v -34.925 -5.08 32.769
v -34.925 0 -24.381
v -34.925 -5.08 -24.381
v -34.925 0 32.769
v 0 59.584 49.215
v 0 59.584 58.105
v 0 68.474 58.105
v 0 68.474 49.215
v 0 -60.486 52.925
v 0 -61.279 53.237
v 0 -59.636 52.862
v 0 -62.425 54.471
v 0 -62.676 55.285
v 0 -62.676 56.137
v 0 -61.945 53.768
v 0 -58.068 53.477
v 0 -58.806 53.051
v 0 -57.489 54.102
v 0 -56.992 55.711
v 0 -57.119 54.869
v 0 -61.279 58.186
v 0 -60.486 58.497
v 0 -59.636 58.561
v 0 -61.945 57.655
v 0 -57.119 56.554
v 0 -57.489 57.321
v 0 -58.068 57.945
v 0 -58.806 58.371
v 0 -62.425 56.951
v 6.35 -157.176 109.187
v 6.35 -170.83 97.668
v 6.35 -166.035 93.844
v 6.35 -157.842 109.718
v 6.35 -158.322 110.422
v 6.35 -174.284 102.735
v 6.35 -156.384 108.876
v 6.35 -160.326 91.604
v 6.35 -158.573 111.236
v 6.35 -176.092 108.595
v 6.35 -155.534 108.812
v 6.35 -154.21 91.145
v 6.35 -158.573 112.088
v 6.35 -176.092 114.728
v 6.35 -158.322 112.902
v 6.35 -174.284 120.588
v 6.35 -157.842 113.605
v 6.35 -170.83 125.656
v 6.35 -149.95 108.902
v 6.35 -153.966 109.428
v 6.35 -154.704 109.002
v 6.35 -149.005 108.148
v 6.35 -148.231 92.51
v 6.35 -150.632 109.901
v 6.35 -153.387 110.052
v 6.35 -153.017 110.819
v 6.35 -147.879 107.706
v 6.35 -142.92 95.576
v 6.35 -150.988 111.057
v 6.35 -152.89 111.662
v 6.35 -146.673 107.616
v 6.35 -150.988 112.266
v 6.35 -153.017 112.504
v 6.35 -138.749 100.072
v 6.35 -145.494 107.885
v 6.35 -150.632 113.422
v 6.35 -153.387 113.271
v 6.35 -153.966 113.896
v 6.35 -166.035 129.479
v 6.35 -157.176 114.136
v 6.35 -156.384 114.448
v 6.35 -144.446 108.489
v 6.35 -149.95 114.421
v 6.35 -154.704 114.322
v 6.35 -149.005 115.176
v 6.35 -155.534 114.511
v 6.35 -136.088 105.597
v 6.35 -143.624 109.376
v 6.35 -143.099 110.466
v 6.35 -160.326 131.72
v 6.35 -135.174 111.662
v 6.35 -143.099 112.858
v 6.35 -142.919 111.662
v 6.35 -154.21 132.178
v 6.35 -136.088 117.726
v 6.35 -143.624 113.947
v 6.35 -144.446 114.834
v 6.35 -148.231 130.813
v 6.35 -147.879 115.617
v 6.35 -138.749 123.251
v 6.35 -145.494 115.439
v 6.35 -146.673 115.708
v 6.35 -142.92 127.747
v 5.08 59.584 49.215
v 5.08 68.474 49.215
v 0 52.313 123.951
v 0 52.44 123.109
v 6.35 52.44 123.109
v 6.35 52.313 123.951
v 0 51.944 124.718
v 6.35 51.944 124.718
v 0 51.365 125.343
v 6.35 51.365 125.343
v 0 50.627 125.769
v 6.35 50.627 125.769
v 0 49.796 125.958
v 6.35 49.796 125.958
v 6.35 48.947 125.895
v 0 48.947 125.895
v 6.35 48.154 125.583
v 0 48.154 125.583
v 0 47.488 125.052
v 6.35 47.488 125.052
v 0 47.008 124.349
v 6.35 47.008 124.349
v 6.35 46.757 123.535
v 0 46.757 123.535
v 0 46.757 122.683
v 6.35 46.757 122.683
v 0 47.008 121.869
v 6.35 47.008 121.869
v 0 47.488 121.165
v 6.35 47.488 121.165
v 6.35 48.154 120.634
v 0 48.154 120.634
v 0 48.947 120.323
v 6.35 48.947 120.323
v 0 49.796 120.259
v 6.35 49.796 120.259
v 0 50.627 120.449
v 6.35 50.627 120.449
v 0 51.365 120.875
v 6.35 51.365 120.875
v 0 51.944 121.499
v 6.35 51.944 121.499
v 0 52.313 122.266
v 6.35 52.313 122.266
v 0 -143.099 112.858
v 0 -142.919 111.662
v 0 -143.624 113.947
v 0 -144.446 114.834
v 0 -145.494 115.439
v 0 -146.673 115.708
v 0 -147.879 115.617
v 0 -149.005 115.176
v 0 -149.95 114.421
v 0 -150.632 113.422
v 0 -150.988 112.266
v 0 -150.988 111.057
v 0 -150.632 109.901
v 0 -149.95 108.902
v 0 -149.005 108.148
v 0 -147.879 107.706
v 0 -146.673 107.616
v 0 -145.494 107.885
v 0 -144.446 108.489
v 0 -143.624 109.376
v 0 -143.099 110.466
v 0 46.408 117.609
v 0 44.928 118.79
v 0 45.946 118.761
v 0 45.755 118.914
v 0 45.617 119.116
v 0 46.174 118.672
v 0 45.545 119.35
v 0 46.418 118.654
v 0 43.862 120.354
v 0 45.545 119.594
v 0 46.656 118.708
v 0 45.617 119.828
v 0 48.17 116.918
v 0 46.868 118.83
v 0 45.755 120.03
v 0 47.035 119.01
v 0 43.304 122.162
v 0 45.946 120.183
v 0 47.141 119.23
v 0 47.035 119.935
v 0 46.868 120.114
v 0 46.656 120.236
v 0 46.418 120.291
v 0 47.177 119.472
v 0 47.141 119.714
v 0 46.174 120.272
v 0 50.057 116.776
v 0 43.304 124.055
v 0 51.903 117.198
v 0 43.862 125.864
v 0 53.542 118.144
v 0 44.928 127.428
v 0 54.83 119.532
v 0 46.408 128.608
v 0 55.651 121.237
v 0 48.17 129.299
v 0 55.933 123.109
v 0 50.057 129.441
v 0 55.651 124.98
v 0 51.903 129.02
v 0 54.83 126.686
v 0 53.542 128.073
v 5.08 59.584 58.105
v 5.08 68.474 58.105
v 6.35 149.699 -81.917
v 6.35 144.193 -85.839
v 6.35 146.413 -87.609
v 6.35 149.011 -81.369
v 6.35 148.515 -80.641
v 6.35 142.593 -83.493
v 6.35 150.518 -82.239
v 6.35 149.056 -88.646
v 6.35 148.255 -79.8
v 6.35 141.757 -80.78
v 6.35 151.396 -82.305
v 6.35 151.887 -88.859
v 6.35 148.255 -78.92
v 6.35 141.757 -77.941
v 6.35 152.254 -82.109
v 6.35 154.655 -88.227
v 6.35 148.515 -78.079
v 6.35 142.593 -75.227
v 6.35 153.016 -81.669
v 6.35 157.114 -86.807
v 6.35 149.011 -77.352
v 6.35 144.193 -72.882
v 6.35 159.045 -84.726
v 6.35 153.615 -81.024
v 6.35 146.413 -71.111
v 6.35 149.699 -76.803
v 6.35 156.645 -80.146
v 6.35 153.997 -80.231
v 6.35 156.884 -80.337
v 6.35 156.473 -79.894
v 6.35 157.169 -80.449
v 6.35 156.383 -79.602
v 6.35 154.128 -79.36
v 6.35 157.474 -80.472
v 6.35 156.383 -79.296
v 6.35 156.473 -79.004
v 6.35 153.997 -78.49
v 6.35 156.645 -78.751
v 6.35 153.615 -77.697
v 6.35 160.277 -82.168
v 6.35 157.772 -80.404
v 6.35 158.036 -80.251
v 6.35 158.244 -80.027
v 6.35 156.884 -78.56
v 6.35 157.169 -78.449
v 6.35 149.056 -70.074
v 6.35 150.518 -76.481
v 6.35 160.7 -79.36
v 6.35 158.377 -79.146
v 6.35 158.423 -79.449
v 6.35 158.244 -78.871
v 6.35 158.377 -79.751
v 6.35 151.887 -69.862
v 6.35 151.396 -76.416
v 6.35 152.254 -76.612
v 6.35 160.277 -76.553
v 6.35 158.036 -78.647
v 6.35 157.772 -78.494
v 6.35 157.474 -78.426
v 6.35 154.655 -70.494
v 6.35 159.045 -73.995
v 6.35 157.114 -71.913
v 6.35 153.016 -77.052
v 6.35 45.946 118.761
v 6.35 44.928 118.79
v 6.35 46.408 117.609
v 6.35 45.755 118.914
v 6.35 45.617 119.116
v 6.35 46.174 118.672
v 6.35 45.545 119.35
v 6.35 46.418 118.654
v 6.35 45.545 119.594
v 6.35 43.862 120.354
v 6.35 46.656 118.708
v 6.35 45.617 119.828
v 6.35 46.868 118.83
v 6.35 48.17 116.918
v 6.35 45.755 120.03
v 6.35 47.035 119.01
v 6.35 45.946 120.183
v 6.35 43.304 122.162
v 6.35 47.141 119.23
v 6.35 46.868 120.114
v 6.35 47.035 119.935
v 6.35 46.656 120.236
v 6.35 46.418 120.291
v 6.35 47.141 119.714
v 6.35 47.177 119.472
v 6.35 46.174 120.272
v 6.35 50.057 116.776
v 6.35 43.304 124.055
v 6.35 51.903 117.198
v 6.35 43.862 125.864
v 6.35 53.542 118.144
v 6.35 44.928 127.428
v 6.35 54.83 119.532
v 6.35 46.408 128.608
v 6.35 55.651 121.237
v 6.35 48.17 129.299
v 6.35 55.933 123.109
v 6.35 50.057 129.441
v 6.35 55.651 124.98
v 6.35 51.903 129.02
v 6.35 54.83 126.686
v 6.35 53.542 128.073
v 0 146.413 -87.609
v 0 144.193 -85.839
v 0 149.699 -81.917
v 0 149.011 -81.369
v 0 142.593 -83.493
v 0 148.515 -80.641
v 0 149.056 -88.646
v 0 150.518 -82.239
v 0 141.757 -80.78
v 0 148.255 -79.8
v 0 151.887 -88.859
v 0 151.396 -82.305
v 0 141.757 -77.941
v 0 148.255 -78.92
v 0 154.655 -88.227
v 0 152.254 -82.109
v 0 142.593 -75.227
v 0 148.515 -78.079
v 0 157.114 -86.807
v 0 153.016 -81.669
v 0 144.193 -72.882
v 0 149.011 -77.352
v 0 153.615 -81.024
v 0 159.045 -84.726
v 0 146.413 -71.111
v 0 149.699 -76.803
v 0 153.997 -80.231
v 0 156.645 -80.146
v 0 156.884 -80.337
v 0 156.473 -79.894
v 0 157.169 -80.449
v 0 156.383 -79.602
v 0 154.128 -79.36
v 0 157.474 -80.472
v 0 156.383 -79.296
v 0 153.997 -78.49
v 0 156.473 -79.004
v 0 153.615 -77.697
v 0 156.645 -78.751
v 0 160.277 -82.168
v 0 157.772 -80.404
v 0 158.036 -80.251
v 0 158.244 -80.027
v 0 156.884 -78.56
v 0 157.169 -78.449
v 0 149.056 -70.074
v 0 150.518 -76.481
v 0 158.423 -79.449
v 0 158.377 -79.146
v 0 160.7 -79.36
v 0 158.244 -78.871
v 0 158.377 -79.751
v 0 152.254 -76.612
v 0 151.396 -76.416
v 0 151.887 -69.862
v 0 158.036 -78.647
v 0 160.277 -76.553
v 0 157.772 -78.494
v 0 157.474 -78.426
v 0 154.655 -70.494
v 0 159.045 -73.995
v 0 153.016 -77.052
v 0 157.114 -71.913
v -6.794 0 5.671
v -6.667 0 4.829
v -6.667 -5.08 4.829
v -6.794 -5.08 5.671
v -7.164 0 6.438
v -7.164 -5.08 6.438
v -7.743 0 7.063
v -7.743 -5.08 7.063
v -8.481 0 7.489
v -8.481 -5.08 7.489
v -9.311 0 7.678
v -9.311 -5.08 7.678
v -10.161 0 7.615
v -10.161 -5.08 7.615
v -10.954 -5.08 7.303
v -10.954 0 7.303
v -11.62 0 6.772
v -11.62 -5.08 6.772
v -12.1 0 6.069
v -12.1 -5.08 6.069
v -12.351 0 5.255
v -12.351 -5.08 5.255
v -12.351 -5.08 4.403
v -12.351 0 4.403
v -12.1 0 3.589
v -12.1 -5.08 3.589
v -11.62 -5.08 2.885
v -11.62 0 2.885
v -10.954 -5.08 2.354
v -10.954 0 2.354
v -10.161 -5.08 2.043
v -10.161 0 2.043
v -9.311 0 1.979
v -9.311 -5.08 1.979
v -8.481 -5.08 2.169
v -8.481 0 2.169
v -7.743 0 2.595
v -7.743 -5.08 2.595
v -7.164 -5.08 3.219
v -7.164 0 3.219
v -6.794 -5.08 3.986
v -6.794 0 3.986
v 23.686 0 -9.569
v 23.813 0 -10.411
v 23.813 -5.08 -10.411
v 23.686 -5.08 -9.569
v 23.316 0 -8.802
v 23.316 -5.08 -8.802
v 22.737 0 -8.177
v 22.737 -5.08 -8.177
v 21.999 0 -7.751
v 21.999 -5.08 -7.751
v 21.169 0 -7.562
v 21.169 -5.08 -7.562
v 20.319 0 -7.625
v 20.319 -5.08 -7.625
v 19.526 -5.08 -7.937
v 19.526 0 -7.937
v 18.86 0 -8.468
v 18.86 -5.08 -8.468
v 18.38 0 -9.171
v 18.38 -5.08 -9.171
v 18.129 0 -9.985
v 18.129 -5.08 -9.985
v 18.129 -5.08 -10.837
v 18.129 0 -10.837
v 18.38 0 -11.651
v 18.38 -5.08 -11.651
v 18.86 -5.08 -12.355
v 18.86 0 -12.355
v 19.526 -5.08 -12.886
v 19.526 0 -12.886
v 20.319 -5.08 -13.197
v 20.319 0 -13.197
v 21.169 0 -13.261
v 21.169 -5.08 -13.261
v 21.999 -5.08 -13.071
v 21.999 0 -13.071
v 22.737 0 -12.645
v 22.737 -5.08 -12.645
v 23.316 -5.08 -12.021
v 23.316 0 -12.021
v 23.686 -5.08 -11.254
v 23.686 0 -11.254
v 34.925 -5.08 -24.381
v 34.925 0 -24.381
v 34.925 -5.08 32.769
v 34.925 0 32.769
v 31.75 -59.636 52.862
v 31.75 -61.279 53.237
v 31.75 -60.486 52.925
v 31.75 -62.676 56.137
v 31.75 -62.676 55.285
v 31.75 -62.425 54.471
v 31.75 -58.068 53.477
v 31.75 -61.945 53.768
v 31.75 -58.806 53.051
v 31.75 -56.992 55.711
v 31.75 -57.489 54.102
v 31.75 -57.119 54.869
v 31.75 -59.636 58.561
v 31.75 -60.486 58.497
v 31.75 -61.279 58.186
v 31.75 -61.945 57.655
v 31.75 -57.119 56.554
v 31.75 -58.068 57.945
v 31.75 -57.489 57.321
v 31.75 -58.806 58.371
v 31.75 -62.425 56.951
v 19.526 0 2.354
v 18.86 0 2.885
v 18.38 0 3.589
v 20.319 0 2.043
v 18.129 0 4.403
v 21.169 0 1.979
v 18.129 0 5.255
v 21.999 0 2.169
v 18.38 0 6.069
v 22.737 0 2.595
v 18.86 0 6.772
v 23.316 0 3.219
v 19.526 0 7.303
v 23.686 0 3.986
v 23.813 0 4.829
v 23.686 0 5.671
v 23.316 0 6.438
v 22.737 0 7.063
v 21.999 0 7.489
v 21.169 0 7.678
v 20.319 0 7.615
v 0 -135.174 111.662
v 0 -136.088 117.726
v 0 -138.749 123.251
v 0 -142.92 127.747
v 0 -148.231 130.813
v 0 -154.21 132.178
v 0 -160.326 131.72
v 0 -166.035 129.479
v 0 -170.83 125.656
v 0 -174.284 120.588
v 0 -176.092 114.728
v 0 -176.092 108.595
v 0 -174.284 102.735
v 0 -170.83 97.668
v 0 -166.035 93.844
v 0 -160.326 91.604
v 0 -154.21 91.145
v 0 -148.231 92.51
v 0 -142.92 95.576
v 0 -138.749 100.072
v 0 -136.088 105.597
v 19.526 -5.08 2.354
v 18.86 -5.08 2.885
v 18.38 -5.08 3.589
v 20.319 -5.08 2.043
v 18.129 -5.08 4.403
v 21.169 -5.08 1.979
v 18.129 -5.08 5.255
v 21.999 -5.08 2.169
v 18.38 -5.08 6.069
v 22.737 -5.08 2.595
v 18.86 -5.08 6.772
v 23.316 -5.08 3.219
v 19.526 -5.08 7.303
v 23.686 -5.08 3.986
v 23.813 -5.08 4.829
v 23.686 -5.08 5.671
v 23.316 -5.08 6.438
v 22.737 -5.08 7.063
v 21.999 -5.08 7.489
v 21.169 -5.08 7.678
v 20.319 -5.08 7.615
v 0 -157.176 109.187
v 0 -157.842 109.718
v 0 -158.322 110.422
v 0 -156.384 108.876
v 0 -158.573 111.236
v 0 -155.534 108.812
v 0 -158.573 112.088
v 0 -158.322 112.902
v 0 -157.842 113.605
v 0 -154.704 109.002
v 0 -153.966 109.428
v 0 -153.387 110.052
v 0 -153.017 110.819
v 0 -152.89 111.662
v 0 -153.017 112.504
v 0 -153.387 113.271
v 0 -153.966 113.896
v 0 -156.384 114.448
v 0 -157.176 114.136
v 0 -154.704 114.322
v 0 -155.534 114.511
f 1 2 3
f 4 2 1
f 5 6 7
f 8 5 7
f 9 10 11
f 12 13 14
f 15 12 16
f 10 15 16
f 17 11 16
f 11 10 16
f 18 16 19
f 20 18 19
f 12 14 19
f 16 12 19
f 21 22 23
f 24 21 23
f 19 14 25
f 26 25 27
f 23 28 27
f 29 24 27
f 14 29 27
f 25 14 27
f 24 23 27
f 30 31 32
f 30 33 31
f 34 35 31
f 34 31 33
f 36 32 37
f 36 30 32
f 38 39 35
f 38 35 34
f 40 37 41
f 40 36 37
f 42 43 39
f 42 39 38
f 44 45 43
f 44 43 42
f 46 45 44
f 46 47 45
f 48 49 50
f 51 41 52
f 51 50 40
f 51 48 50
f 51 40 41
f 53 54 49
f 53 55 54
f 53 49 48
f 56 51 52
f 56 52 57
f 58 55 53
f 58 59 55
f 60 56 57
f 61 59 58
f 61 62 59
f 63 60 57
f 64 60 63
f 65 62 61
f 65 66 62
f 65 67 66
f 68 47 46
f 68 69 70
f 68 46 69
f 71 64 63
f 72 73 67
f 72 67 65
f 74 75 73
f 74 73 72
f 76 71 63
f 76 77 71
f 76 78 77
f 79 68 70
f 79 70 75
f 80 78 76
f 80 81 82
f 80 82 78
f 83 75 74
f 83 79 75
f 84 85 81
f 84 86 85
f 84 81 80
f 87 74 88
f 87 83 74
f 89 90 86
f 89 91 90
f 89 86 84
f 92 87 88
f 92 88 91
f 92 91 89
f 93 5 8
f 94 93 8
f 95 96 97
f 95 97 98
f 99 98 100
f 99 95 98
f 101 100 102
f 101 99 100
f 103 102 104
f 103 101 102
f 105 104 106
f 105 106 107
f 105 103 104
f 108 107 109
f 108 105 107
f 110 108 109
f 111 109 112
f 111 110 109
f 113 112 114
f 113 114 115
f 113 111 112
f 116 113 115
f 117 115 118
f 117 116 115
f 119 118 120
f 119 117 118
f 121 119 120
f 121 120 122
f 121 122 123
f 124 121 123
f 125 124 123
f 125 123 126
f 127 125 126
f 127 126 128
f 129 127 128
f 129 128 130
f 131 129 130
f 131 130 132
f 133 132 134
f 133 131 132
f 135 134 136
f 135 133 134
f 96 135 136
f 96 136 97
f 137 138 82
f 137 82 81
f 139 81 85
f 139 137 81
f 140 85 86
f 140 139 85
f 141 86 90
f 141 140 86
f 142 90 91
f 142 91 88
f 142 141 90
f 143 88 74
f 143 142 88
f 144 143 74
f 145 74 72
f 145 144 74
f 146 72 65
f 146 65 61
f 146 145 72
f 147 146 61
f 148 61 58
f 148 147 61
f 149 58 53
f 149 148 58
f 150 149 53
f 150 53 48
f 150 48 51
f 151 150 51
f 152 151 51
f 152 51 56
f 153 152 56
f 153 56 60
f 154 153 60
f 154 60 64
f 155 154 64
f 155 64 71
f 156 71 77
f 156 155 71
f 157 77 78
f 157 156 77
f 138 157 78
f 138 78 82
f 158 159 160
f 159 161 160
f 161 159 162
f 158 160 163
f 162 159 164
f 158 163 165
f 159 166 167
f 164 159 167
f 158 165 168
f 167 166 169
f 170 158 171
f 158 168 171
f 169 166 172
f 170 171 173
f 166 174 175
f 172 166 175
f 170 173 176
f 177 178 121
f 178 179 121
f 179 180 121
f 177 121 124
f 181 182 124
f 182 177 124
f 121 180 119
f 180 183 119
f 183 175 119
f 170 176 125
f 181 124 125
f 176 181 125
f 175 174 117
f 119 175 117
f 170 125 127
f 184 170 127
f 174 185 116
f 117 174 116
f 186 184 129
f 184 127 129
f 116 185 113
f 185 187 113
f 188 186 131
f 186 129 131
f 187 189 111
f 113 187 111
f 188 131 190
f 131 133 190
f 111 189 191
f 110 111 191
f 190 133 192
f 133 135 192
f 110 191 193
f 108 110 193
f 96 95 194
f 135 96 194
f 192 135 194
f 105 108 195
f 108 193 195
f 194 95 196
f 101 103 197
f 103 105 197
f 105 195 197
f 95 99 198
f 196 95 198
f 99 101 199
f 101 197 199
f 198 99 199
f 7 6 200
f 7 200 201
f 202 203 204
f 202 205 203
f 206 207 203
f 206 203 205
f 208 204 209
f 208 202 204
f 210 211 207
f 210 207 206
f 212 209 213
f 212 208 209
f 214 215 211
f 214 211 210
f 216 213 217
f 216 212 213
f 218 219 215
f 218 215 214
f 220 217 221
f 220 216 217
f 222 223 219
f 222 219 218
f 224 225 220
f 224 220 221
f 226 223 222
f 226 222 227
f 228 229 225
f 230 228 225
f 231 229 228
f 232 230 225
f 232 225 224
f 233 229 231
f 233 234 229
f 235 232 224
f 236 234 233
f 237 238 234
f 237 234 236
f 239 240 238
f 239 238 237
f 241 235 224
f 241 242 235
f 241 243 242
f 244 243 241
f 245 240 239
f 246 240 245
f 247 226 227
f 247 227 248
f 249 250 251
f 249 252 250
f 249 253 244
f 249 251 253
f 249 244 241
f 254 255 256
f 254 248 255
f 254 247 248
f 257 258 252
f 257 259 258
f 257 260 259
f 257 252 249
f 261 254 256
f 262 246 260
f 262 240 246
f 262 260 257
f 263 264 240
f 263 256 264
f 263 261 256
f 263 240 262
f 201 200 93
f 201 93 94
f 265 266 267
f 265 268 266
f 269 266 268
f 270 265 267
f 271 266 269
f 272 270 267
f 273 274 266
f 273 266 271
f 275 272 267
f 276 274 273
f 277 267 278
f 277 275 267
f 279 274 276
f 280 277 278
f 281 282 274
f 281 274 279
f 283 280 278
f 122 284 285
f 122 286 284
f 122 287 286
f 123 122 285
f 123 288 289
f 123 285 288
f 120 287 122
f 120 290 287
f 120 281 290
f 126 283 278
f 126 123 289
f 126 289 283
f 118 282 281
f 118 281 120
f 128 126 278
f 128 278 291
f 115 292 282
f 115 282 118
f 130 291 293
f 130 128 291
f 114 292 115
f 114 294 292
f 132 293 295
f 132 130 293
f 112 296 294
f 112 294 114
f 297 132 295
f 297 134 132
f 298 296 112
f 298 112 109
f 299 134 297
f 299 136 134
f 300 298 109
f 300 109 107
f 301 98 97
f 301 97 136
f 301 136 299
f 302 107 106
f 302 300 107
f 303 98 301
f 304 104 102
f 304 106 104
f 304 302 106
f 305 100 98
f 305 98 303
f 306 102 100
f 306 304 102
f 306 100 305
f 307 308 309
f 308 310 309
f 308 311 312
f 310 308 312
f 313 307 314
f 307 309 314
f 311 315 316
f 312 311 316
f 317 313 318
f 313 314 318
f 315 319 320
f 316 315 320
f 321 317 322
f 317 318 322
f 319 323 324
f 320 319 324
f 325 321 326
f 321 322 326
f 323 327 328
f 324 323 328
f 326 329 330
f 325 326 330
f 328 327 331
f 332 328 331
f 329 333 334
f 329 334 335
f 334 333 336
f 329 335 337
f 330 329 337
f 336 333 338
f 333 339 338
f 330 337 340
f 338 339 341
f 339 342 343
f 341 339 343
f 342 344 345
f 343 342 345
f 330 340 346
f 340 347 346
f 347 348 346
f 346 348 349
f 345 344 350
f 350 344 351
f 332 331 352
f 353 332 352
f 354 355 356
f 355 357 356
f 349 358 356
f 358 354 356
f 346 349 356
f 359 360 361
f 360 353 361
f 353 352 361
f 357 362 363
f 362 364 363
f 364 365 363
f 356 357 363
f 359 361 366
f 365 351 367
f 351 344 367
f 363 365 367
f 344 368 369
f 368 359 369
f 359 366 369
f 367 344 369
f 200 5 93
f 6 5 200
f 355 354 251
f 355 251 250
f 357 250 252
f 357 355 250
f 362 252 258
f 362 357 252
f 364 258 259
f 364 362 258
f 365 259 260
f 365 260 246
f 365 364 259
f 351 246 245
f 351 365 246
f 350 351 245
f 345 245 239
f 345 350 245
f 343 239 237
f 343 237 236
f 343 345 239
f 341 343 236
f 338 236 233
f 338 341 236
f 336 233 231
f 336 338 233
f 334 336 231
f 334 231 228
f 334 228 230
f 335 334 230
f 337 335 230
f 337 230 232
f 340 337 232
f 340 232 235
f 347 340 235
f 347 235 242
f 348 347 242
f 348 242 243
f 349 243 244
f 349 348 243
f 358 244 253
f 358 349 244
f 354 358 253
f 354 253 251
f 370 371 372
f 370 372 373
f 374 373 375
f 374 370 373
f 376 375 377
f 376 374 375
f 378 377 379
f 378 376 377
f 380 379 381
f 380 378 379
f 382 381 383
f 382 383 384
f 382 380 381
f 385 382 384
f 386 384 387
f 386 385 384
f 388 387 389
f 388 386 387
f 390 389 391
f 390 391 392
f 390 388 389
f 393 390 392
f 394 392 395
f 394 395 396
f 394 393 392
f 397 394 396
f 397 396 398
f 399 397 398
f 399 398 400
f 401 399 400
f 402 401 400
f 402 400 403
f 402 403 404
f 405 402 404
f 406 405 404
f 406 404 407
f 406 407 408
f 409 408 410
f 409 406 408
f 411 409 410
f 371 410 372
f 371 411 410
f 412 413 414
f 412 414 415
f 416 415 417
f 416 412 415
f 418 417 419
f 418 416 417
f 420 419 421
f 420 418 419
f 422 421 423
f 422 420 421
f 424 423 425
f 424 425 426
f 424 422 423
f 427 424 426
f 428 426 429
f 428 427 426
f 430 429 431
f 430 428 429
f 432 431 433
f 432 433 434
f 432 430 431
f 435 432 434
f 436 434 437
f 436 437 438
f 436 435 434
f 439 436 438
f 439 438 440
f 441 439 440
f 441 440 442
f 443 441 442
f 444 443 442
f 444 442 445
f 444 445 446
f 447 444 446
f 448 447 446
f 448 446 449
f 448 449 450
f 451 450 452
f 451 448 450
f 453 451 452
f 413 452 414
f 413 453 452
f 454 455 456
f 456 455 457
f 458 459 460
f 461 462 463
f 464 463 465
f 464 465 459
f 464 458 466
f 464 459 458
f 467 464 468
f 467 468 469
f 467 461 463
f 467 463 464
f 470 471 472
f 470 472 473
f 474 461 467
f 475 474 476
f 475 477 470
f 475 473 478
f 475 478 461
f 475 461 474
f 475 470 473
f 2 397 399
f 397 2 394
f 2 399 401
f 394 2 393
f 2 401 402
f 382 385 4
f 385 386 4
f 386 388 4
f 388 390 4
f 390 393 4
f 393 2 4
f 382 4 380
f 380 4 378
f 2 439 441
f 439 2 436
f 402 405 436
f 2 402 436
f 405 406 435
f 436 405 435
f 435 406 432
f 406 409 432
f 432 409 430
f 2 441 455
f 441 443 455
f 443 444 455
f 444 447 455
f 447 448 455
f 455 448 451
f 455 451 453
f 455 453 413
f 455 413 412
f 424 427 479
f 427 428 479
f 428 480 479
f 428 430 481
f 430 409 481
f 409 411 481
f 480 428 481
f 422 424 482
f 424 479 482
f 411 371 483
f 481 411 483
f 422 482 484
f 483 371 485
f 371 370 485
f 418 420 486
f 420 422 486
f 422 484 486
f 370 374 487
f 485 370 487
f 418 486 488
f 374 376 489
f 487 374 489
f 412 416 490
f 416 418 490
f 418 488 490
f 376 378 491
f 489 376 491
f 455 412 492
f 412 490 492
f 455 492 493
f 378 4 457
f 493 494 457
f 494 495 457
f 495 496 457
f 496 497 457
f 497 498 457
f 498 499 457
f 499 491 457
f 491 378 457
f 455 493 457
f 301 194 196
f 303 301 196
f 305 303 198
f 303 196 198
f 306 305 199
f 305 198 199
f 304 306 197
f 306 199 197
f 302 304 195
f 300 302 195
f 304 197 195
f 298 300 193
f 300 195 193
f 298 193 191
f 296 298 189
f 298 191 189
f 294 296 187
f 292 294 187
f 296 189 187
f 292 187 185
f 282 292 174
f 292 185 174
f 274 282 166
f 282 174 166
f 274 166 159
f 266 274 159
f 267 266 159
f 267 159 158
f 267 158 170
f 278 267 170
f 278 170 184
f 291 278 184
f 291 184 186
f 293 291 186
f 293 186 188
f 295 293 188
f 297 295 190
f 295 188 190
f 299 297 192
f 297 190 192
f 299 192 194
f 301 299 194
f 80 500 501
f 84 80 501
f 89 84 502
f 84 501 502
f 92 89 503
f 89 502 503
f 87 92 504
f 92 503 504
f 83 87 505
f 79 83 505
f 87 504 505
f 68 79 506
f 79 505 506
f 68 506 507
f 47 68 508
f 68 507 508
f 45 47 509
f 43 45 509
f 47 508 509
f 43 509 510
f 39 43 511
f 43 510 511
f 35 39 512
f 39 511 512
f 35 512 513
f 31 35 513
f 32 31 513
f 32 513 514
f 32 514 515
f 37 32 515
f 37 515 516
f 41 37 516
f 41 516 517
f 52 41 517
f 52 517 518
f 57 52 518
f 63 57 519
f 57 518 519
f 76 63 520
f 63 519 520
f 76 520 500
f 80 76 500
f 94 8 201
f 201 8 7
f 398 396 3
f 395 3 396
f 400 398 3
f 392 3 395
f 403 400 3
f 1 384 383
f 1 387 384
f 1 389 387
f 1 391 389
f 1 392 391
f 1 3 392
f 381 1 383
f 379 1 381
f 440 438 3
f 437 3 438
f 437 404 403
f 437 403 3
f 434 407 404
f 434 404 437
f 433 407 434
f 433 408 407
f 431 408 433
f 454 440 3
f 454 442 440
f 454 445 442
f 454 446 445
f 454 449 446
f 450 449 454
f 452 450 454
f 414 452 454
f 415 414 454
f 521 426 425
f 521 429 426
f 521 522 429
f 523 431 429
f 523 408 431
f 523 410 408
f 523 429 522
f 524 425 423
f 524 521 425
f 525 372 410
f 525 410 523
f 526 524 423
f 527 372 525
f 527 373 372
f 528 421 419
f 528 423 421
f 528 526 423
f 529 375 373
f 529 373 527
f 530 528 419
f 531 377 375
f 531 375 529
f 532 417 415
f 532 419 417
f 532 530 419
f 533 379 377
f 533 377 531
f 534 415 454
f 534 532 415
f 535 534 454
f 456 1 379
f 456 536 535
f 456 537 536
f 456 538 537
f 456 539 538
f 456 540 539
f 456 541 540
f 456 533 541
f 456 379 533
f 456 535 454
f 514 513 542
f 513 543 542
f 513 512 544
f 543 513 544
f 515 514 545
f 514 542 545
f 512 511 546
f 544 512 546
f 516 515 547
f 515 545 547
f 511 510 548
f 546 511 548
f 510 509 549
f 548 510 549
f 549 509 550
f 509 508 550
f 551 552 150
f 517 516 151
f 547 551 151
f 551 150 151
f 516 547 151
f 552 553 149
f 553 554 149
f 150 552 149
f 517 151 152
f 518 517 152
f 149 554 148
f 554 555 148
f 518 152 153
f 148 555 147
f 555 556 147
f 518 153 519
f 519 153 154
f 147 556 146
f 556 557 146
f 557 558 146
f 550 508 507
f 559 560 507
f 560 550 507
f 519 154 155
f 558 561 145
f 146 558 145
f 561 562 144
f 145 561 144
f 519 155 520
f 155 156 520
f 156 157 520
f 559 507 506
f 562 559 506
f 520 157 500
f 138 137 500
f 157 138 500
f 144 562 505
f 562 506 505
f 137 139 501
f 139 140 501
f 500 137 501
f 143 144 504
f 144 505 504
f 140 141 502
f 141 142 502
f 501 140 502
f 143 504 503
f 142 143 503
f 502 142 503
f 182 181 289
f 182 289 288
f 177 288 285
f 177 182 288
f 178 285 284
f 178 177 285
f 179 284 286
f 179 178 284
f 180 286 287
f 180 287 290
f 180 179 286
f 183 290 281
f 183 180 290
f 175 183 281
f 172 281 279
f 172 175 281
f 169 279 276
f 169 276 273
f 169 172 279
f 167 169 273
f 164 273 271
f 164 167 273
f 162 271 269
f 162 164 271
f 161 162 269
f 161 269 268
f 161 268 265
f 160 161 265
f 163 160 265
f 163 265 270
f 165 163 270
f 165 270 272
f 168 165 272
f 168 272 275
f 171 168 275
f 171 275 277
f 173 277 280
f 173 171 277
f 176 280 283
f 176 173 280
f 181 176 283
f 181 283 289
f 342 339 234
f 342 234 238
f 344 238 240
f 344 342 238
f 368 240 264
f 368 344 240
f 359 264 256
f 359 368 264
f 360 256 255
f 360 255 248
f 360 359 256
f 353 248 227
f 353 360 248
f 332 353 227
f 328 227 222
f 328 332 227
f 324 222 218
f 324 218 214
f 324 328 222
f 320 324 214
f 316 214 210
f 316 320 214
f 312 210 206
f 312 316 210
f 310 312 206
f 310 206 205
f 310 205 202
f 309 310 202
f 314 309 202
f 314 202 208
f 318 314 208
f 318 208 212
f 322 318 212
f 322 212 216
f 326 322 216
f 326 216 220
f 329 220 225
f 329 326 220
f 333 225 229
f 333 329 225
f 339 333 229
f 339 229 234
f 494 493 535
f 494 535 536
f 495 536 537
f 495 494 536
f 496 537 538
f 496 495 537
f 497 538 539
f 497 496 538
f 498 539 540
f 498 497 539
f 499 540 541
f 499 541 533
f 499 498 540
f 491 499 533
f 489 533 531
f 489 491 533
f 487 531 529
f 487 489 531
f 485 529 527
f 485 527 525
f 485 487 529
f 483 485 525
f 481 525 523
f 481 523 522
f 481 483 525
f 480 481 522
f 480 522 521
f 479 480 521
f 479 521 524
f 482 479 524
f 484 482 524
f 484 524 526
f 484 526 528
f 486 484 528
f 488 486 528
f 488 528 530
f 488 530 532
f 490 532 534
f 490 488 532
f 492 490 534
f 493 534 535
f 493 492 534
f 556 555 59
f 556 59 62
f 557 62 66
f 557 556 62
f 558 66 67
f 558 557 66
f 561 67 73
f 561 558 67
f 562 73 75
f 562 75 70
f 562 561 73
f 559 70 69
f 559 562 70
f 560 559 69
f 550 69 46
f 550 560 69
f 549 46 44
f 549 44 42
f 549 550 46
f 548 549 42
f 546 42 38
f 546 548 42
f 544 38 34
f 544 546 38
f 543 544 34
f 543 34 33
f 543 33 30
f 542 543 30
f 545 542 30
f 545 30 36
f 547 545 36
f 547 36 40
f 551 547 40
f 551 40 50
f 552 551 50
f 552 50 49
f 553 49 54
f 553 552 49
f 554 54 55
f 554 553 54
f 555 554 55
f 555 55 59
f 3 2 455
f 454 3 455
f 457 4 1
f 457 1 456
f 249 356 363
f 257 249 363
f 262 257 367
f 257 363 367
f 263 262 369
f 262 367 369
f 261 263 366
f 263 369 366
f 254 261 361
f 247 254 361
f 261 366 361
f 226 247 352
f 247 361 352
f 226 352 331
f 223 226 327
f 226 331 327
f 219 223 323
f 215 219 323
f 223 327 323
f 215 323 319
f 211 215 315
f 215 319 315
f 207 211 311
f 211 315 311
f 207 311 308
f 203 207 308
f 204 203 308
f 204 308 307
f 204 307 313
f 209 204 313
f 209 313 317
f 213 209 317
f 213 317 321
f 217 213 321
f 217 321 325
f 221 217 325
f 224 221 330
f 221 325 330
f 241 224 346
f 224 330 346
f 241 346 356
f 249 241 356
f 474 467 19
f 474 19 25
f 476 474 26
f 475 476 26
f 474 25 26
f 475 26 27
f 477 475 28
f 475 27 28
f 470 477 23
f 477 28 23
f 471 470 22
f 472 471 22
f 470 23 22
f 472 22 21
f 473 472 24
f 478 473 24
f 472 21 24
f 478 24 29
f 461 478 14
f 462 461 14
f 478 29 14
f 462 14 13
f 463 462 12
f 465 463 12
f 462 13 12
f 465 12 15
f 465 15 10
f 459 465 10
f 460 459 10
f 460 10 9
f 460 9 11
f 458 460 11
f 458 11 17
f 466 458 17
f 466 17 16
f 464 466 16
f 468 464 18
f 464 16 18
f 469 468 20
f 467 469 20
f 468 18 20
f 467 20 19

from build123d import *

# Parameters (mm, degrees)
F0_W     = 69.85
F0_H     = 57.15
F0_R     = 2.8575
F1_DEPTH = 5.08
F2_R     = 20.574
F2_R_2   = 2.8575
F2_R_3   = 4.057439
F2_R_4   = 6.35
F2_R_5   = 0.820909
F2_R_6   = 9.525
F2_R_7   = 2.95275
F2_R_8   = 1.025774
F3_DEPTH = 6.35
F4_R     = 2.8575
F5_DEPTH = 31.75
F6_W     = 8.89
F6_H     = 8.89
F7_DEPTH = 5.08


with BuildPart() as f1:
    # F0 (on Front) → F1 (new body)
    with BuildSketch(Plane.XZ):
        with Locations((2e-06, 4.193716)):
            Rectangle(F0_W, F0_H)
        with Locations((20.955002, -10.411284)):
            Circle(F0_R, mode=Mode.SUBTRACT)
        with Locations((-9.524998, 4.828716)):
            Circle(F0_R, mode=Mode.SUBTRACT)
        with Locations((20.955002, 4.828716)):
            Circle(F0_R, mode=Mode.SUBTRACT)
    extrude(amount=F1_DEPTH)


with BuildPart() as f3:
    # F2 (on Right) → F3 (new body)
    with BuildSketch(Plane.YZ):
        with Locations((-155.7477, 111.661687)):
            Circle(F2_R)
        with Locations((-155.7477, 111.661687)):
            Circle(F2_R_2, mode=Mode.SUBTRACT)
        with Locations((-146.975994, 111.661687)):
            Circle(F2_R_3, mode=Mode.SUBTRACT)
        with Locations((49.58295, 123.108699)):
            Circle(F2_R_4)
        with Locations((46.356283, 119.472131)):
            Circle(F2_R_5, mode=Mode.SUBTRACT)
        with Locations((49.58295, 123.108699)):
            Circle(F2_R_2, mode=Mode.SUBTRACT)
        with Locations((151.175125, -79.360212)):
            Circle(F2_R_6)
        with Locations((151.175125, -79.360212)):
            Circle(F2_R_7, mode=Mode.SUBTRACT)
        with Locations((157.396898, -79.448685)):
            Circle(F2_R_8, mode=Mode.SUBTRACT)
    extrude(amount=F3_DEPTH)


with BuildPart() as f5:
    # F4 (on Right) → F5 (new body)
    with BuildSketch(Plane.YZ):
        with Locations((-59.85, 55.711281)):
            Circle(F4_R)
    extrude(amount=F5_DEPTH)


with BuildPart() as f7:
    # F6 (on Right) → F7 (new body)
    with BuildSketch(Plane.YZ):
        with Locations((64.029455, 53.659578)):
            Rectangle(F6_W, F6_H)
    extrude(amount=F7_DEPTH)


solid = Compound([f1.part, f3.part, f5.part, f7.part])
